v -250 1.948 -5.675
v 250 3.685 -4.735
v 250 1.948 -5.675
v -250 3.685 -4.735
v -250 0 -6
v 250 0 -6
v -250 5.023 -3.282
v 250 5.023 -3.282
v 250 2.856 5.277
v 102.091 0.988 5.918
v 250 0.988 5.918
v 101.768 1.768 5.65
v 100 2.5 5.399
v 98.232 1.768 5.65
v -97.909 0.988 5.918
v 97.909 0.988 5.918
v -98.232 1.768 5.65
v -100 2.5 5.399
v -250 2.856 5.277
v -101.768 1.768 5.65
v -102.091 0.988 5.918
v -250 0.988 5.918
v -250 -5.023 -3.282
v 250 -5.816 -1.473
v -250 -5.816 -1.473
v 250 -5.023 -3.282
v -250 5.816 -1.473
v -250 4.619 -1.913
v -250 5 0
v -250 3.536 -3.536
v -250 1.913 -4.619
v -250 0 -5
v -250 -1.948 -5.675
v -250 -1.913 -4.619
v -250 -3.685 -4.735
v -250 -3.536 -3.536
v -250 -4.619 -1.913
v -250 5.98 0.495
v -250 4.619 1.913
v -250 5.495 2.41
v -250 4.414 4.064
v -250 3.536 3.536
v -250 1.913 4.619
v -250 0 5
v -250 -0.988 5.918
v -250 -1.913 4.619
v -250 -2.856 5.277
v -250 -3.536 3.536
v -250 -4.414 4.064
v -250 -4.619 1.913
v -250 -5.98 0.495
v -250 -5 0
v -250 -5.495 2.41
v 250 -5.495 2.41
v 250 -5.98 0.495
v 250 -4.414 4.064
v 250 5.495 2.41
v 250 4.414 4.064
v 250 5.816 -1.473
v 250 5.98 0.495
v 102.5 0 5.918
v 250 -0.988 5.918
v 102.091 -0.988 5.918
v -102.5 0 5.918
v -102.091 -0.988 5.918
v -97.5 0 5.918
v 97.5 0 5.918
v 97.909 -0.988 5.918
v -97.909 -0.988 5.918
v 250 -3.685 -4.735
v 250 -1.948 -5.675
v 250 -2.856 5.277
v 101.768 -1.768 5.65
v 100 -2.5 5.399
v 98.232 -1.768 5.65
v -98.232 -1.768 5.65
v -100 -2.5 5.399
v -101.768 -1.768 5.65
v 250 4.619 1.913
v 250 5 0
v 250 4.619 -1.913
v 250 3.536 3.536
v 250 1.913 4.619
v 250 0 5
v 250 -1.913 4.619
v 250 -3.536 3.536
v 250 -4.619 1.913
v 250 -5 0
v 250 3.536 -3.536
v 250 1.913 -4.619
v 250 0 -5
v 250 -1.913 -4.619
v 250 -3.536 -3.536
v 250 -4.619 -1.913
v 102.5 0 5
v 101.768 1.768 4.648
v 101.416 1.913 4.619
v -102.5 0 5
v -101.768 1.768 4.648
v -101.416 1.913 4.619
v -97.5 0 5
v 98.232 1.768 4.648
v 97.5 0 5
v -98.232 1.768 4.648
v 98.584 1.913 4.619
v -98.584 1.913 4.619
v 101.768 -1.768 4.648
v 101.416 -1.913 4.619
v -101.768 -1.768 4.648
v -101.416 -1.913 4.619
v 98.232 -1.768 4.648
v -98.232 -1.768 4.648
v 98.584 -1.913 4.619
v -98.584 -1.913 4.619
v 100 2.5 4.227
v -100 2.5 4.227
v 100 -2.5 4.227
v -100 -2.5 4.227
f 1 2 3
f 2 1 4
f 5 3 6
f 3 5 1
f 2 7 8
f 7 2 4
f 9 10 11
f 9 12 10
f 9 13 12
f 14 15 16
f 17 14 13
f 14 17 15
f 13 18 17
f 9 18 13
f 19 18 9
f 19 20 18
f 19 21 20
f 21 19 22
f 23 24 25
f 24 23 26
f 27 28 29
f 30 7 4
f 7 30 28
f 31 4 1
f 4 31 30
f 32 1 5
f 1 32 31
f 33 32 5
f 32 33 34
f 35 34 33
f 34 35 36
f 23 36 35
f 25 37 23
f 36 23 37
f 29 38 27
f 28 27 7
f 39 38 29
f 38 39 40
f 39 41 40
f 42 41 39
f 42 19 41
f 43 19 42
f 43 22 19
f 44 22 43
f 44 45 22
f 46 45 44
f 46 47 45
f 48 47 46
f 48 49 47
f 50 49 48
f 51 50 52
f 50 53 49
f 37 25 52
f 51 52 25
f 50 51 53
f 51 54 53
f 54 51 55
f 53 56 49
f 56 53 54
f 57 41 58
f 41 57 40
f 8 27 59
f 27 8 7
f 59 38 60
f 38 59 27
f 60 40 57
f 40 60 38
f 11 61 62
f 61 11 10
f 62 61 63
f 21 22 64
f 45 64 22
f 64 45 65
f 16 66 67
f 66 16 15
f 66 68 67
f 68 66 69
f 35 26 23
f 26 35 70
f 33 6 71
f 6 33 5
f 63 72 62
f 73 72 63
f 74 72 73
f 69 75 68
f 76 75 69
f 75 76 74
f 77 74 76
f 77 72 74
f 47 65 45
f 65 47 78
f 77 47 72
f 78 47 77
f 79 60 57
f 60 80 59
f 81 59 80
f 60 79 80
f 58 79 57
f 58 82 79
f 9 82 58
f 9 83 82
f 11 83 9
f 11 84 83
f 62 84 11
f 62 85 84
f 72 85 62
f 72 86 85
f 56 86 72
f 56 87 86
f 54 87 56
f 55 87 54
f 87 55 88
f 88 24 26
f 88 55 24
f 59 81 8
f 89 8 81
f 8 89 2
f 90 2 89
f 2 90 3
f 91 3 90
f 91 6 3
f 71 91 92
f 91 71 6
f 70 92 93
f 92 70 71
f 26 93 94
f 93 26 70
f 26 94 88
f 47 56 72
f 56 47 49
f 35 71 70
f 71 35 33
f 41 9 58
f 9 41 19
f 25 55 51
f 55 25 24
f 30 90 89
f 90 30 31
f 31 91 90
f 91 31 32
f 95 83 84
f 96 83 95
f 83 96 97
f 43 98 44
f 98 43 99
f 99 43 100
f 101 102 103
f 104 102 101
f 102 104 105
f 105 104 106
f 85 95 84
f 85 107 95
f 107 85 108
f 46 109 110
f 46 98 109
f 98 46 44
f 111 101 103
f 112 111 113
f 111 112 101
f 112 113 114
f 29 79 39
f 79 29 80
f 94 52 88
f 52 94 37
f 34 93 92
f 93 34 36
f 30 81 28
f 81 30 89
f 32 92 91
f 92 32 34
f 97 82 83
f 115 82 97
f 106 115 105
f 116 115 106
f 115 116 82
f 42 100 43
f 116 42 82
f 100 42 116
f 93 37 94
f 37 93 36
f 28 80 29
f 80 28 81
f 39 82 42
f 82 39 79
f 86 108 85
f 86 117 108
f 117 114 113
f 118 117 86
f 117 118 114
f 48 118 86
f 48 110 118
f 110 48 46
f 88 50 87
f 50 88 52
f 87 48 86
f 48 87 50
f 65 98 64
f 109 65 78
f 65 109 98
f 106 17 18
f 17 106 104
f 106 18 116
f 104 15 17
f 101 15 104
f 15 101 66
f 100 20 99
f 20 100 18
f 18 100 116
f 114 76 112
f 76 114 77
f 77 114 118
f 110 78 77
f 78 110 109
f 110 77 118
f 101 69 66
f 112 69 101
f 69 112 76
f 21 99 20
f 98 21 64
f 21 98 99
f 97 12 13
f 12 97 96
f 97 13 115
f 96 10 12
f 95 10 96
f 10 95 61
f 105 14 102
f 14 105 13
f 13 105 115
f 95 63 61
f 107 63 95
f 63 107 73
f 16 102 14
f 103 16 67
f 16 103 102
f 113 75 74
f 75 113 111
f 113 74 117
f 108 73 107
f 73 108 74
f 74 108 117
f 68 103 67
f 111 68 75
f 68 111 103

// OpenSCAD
// file: ../conf/parameters.scad
//rendering
epsilon=0.01;

//model
frame_length=1000;
frame_inner=19;
frame_outer=20;

support_width=100;
support_height=0.2;
support_inner=90;
support_diameter=3;

rack_width=150;
rack_inner=140;
rack_diameter=3;

stand_height=200;
stand_width=200;
stand_diameter=5;
stand_head_height=20;
stand_head_diameter=4;

foot_outer=12;
foot_inner=10;
foot_length=500;

motor_hole_distance=450;
motor_hole_diameter=12;
motor_mount_distance=19;
motor_mount_diameter=3;
// main file
include <../conf/parameters.scad>

module foot() {

color("white")
difference() {

	rotate([0,90,0])
	difference() {
		cylinder(foot_length,d=foot_outer, center=true);
		cylinder(foot_length+epsilon,d=foot_inner, center=true);
	}

	translate([-stand_width/2,0,0])
	cylinder(foot_outer,d=stand_diameter,center=false);

	translate([stand_width/2,0,0])
	cylinder(foot_outer,d=stand_diameter,center=false);

}
}

foot();
